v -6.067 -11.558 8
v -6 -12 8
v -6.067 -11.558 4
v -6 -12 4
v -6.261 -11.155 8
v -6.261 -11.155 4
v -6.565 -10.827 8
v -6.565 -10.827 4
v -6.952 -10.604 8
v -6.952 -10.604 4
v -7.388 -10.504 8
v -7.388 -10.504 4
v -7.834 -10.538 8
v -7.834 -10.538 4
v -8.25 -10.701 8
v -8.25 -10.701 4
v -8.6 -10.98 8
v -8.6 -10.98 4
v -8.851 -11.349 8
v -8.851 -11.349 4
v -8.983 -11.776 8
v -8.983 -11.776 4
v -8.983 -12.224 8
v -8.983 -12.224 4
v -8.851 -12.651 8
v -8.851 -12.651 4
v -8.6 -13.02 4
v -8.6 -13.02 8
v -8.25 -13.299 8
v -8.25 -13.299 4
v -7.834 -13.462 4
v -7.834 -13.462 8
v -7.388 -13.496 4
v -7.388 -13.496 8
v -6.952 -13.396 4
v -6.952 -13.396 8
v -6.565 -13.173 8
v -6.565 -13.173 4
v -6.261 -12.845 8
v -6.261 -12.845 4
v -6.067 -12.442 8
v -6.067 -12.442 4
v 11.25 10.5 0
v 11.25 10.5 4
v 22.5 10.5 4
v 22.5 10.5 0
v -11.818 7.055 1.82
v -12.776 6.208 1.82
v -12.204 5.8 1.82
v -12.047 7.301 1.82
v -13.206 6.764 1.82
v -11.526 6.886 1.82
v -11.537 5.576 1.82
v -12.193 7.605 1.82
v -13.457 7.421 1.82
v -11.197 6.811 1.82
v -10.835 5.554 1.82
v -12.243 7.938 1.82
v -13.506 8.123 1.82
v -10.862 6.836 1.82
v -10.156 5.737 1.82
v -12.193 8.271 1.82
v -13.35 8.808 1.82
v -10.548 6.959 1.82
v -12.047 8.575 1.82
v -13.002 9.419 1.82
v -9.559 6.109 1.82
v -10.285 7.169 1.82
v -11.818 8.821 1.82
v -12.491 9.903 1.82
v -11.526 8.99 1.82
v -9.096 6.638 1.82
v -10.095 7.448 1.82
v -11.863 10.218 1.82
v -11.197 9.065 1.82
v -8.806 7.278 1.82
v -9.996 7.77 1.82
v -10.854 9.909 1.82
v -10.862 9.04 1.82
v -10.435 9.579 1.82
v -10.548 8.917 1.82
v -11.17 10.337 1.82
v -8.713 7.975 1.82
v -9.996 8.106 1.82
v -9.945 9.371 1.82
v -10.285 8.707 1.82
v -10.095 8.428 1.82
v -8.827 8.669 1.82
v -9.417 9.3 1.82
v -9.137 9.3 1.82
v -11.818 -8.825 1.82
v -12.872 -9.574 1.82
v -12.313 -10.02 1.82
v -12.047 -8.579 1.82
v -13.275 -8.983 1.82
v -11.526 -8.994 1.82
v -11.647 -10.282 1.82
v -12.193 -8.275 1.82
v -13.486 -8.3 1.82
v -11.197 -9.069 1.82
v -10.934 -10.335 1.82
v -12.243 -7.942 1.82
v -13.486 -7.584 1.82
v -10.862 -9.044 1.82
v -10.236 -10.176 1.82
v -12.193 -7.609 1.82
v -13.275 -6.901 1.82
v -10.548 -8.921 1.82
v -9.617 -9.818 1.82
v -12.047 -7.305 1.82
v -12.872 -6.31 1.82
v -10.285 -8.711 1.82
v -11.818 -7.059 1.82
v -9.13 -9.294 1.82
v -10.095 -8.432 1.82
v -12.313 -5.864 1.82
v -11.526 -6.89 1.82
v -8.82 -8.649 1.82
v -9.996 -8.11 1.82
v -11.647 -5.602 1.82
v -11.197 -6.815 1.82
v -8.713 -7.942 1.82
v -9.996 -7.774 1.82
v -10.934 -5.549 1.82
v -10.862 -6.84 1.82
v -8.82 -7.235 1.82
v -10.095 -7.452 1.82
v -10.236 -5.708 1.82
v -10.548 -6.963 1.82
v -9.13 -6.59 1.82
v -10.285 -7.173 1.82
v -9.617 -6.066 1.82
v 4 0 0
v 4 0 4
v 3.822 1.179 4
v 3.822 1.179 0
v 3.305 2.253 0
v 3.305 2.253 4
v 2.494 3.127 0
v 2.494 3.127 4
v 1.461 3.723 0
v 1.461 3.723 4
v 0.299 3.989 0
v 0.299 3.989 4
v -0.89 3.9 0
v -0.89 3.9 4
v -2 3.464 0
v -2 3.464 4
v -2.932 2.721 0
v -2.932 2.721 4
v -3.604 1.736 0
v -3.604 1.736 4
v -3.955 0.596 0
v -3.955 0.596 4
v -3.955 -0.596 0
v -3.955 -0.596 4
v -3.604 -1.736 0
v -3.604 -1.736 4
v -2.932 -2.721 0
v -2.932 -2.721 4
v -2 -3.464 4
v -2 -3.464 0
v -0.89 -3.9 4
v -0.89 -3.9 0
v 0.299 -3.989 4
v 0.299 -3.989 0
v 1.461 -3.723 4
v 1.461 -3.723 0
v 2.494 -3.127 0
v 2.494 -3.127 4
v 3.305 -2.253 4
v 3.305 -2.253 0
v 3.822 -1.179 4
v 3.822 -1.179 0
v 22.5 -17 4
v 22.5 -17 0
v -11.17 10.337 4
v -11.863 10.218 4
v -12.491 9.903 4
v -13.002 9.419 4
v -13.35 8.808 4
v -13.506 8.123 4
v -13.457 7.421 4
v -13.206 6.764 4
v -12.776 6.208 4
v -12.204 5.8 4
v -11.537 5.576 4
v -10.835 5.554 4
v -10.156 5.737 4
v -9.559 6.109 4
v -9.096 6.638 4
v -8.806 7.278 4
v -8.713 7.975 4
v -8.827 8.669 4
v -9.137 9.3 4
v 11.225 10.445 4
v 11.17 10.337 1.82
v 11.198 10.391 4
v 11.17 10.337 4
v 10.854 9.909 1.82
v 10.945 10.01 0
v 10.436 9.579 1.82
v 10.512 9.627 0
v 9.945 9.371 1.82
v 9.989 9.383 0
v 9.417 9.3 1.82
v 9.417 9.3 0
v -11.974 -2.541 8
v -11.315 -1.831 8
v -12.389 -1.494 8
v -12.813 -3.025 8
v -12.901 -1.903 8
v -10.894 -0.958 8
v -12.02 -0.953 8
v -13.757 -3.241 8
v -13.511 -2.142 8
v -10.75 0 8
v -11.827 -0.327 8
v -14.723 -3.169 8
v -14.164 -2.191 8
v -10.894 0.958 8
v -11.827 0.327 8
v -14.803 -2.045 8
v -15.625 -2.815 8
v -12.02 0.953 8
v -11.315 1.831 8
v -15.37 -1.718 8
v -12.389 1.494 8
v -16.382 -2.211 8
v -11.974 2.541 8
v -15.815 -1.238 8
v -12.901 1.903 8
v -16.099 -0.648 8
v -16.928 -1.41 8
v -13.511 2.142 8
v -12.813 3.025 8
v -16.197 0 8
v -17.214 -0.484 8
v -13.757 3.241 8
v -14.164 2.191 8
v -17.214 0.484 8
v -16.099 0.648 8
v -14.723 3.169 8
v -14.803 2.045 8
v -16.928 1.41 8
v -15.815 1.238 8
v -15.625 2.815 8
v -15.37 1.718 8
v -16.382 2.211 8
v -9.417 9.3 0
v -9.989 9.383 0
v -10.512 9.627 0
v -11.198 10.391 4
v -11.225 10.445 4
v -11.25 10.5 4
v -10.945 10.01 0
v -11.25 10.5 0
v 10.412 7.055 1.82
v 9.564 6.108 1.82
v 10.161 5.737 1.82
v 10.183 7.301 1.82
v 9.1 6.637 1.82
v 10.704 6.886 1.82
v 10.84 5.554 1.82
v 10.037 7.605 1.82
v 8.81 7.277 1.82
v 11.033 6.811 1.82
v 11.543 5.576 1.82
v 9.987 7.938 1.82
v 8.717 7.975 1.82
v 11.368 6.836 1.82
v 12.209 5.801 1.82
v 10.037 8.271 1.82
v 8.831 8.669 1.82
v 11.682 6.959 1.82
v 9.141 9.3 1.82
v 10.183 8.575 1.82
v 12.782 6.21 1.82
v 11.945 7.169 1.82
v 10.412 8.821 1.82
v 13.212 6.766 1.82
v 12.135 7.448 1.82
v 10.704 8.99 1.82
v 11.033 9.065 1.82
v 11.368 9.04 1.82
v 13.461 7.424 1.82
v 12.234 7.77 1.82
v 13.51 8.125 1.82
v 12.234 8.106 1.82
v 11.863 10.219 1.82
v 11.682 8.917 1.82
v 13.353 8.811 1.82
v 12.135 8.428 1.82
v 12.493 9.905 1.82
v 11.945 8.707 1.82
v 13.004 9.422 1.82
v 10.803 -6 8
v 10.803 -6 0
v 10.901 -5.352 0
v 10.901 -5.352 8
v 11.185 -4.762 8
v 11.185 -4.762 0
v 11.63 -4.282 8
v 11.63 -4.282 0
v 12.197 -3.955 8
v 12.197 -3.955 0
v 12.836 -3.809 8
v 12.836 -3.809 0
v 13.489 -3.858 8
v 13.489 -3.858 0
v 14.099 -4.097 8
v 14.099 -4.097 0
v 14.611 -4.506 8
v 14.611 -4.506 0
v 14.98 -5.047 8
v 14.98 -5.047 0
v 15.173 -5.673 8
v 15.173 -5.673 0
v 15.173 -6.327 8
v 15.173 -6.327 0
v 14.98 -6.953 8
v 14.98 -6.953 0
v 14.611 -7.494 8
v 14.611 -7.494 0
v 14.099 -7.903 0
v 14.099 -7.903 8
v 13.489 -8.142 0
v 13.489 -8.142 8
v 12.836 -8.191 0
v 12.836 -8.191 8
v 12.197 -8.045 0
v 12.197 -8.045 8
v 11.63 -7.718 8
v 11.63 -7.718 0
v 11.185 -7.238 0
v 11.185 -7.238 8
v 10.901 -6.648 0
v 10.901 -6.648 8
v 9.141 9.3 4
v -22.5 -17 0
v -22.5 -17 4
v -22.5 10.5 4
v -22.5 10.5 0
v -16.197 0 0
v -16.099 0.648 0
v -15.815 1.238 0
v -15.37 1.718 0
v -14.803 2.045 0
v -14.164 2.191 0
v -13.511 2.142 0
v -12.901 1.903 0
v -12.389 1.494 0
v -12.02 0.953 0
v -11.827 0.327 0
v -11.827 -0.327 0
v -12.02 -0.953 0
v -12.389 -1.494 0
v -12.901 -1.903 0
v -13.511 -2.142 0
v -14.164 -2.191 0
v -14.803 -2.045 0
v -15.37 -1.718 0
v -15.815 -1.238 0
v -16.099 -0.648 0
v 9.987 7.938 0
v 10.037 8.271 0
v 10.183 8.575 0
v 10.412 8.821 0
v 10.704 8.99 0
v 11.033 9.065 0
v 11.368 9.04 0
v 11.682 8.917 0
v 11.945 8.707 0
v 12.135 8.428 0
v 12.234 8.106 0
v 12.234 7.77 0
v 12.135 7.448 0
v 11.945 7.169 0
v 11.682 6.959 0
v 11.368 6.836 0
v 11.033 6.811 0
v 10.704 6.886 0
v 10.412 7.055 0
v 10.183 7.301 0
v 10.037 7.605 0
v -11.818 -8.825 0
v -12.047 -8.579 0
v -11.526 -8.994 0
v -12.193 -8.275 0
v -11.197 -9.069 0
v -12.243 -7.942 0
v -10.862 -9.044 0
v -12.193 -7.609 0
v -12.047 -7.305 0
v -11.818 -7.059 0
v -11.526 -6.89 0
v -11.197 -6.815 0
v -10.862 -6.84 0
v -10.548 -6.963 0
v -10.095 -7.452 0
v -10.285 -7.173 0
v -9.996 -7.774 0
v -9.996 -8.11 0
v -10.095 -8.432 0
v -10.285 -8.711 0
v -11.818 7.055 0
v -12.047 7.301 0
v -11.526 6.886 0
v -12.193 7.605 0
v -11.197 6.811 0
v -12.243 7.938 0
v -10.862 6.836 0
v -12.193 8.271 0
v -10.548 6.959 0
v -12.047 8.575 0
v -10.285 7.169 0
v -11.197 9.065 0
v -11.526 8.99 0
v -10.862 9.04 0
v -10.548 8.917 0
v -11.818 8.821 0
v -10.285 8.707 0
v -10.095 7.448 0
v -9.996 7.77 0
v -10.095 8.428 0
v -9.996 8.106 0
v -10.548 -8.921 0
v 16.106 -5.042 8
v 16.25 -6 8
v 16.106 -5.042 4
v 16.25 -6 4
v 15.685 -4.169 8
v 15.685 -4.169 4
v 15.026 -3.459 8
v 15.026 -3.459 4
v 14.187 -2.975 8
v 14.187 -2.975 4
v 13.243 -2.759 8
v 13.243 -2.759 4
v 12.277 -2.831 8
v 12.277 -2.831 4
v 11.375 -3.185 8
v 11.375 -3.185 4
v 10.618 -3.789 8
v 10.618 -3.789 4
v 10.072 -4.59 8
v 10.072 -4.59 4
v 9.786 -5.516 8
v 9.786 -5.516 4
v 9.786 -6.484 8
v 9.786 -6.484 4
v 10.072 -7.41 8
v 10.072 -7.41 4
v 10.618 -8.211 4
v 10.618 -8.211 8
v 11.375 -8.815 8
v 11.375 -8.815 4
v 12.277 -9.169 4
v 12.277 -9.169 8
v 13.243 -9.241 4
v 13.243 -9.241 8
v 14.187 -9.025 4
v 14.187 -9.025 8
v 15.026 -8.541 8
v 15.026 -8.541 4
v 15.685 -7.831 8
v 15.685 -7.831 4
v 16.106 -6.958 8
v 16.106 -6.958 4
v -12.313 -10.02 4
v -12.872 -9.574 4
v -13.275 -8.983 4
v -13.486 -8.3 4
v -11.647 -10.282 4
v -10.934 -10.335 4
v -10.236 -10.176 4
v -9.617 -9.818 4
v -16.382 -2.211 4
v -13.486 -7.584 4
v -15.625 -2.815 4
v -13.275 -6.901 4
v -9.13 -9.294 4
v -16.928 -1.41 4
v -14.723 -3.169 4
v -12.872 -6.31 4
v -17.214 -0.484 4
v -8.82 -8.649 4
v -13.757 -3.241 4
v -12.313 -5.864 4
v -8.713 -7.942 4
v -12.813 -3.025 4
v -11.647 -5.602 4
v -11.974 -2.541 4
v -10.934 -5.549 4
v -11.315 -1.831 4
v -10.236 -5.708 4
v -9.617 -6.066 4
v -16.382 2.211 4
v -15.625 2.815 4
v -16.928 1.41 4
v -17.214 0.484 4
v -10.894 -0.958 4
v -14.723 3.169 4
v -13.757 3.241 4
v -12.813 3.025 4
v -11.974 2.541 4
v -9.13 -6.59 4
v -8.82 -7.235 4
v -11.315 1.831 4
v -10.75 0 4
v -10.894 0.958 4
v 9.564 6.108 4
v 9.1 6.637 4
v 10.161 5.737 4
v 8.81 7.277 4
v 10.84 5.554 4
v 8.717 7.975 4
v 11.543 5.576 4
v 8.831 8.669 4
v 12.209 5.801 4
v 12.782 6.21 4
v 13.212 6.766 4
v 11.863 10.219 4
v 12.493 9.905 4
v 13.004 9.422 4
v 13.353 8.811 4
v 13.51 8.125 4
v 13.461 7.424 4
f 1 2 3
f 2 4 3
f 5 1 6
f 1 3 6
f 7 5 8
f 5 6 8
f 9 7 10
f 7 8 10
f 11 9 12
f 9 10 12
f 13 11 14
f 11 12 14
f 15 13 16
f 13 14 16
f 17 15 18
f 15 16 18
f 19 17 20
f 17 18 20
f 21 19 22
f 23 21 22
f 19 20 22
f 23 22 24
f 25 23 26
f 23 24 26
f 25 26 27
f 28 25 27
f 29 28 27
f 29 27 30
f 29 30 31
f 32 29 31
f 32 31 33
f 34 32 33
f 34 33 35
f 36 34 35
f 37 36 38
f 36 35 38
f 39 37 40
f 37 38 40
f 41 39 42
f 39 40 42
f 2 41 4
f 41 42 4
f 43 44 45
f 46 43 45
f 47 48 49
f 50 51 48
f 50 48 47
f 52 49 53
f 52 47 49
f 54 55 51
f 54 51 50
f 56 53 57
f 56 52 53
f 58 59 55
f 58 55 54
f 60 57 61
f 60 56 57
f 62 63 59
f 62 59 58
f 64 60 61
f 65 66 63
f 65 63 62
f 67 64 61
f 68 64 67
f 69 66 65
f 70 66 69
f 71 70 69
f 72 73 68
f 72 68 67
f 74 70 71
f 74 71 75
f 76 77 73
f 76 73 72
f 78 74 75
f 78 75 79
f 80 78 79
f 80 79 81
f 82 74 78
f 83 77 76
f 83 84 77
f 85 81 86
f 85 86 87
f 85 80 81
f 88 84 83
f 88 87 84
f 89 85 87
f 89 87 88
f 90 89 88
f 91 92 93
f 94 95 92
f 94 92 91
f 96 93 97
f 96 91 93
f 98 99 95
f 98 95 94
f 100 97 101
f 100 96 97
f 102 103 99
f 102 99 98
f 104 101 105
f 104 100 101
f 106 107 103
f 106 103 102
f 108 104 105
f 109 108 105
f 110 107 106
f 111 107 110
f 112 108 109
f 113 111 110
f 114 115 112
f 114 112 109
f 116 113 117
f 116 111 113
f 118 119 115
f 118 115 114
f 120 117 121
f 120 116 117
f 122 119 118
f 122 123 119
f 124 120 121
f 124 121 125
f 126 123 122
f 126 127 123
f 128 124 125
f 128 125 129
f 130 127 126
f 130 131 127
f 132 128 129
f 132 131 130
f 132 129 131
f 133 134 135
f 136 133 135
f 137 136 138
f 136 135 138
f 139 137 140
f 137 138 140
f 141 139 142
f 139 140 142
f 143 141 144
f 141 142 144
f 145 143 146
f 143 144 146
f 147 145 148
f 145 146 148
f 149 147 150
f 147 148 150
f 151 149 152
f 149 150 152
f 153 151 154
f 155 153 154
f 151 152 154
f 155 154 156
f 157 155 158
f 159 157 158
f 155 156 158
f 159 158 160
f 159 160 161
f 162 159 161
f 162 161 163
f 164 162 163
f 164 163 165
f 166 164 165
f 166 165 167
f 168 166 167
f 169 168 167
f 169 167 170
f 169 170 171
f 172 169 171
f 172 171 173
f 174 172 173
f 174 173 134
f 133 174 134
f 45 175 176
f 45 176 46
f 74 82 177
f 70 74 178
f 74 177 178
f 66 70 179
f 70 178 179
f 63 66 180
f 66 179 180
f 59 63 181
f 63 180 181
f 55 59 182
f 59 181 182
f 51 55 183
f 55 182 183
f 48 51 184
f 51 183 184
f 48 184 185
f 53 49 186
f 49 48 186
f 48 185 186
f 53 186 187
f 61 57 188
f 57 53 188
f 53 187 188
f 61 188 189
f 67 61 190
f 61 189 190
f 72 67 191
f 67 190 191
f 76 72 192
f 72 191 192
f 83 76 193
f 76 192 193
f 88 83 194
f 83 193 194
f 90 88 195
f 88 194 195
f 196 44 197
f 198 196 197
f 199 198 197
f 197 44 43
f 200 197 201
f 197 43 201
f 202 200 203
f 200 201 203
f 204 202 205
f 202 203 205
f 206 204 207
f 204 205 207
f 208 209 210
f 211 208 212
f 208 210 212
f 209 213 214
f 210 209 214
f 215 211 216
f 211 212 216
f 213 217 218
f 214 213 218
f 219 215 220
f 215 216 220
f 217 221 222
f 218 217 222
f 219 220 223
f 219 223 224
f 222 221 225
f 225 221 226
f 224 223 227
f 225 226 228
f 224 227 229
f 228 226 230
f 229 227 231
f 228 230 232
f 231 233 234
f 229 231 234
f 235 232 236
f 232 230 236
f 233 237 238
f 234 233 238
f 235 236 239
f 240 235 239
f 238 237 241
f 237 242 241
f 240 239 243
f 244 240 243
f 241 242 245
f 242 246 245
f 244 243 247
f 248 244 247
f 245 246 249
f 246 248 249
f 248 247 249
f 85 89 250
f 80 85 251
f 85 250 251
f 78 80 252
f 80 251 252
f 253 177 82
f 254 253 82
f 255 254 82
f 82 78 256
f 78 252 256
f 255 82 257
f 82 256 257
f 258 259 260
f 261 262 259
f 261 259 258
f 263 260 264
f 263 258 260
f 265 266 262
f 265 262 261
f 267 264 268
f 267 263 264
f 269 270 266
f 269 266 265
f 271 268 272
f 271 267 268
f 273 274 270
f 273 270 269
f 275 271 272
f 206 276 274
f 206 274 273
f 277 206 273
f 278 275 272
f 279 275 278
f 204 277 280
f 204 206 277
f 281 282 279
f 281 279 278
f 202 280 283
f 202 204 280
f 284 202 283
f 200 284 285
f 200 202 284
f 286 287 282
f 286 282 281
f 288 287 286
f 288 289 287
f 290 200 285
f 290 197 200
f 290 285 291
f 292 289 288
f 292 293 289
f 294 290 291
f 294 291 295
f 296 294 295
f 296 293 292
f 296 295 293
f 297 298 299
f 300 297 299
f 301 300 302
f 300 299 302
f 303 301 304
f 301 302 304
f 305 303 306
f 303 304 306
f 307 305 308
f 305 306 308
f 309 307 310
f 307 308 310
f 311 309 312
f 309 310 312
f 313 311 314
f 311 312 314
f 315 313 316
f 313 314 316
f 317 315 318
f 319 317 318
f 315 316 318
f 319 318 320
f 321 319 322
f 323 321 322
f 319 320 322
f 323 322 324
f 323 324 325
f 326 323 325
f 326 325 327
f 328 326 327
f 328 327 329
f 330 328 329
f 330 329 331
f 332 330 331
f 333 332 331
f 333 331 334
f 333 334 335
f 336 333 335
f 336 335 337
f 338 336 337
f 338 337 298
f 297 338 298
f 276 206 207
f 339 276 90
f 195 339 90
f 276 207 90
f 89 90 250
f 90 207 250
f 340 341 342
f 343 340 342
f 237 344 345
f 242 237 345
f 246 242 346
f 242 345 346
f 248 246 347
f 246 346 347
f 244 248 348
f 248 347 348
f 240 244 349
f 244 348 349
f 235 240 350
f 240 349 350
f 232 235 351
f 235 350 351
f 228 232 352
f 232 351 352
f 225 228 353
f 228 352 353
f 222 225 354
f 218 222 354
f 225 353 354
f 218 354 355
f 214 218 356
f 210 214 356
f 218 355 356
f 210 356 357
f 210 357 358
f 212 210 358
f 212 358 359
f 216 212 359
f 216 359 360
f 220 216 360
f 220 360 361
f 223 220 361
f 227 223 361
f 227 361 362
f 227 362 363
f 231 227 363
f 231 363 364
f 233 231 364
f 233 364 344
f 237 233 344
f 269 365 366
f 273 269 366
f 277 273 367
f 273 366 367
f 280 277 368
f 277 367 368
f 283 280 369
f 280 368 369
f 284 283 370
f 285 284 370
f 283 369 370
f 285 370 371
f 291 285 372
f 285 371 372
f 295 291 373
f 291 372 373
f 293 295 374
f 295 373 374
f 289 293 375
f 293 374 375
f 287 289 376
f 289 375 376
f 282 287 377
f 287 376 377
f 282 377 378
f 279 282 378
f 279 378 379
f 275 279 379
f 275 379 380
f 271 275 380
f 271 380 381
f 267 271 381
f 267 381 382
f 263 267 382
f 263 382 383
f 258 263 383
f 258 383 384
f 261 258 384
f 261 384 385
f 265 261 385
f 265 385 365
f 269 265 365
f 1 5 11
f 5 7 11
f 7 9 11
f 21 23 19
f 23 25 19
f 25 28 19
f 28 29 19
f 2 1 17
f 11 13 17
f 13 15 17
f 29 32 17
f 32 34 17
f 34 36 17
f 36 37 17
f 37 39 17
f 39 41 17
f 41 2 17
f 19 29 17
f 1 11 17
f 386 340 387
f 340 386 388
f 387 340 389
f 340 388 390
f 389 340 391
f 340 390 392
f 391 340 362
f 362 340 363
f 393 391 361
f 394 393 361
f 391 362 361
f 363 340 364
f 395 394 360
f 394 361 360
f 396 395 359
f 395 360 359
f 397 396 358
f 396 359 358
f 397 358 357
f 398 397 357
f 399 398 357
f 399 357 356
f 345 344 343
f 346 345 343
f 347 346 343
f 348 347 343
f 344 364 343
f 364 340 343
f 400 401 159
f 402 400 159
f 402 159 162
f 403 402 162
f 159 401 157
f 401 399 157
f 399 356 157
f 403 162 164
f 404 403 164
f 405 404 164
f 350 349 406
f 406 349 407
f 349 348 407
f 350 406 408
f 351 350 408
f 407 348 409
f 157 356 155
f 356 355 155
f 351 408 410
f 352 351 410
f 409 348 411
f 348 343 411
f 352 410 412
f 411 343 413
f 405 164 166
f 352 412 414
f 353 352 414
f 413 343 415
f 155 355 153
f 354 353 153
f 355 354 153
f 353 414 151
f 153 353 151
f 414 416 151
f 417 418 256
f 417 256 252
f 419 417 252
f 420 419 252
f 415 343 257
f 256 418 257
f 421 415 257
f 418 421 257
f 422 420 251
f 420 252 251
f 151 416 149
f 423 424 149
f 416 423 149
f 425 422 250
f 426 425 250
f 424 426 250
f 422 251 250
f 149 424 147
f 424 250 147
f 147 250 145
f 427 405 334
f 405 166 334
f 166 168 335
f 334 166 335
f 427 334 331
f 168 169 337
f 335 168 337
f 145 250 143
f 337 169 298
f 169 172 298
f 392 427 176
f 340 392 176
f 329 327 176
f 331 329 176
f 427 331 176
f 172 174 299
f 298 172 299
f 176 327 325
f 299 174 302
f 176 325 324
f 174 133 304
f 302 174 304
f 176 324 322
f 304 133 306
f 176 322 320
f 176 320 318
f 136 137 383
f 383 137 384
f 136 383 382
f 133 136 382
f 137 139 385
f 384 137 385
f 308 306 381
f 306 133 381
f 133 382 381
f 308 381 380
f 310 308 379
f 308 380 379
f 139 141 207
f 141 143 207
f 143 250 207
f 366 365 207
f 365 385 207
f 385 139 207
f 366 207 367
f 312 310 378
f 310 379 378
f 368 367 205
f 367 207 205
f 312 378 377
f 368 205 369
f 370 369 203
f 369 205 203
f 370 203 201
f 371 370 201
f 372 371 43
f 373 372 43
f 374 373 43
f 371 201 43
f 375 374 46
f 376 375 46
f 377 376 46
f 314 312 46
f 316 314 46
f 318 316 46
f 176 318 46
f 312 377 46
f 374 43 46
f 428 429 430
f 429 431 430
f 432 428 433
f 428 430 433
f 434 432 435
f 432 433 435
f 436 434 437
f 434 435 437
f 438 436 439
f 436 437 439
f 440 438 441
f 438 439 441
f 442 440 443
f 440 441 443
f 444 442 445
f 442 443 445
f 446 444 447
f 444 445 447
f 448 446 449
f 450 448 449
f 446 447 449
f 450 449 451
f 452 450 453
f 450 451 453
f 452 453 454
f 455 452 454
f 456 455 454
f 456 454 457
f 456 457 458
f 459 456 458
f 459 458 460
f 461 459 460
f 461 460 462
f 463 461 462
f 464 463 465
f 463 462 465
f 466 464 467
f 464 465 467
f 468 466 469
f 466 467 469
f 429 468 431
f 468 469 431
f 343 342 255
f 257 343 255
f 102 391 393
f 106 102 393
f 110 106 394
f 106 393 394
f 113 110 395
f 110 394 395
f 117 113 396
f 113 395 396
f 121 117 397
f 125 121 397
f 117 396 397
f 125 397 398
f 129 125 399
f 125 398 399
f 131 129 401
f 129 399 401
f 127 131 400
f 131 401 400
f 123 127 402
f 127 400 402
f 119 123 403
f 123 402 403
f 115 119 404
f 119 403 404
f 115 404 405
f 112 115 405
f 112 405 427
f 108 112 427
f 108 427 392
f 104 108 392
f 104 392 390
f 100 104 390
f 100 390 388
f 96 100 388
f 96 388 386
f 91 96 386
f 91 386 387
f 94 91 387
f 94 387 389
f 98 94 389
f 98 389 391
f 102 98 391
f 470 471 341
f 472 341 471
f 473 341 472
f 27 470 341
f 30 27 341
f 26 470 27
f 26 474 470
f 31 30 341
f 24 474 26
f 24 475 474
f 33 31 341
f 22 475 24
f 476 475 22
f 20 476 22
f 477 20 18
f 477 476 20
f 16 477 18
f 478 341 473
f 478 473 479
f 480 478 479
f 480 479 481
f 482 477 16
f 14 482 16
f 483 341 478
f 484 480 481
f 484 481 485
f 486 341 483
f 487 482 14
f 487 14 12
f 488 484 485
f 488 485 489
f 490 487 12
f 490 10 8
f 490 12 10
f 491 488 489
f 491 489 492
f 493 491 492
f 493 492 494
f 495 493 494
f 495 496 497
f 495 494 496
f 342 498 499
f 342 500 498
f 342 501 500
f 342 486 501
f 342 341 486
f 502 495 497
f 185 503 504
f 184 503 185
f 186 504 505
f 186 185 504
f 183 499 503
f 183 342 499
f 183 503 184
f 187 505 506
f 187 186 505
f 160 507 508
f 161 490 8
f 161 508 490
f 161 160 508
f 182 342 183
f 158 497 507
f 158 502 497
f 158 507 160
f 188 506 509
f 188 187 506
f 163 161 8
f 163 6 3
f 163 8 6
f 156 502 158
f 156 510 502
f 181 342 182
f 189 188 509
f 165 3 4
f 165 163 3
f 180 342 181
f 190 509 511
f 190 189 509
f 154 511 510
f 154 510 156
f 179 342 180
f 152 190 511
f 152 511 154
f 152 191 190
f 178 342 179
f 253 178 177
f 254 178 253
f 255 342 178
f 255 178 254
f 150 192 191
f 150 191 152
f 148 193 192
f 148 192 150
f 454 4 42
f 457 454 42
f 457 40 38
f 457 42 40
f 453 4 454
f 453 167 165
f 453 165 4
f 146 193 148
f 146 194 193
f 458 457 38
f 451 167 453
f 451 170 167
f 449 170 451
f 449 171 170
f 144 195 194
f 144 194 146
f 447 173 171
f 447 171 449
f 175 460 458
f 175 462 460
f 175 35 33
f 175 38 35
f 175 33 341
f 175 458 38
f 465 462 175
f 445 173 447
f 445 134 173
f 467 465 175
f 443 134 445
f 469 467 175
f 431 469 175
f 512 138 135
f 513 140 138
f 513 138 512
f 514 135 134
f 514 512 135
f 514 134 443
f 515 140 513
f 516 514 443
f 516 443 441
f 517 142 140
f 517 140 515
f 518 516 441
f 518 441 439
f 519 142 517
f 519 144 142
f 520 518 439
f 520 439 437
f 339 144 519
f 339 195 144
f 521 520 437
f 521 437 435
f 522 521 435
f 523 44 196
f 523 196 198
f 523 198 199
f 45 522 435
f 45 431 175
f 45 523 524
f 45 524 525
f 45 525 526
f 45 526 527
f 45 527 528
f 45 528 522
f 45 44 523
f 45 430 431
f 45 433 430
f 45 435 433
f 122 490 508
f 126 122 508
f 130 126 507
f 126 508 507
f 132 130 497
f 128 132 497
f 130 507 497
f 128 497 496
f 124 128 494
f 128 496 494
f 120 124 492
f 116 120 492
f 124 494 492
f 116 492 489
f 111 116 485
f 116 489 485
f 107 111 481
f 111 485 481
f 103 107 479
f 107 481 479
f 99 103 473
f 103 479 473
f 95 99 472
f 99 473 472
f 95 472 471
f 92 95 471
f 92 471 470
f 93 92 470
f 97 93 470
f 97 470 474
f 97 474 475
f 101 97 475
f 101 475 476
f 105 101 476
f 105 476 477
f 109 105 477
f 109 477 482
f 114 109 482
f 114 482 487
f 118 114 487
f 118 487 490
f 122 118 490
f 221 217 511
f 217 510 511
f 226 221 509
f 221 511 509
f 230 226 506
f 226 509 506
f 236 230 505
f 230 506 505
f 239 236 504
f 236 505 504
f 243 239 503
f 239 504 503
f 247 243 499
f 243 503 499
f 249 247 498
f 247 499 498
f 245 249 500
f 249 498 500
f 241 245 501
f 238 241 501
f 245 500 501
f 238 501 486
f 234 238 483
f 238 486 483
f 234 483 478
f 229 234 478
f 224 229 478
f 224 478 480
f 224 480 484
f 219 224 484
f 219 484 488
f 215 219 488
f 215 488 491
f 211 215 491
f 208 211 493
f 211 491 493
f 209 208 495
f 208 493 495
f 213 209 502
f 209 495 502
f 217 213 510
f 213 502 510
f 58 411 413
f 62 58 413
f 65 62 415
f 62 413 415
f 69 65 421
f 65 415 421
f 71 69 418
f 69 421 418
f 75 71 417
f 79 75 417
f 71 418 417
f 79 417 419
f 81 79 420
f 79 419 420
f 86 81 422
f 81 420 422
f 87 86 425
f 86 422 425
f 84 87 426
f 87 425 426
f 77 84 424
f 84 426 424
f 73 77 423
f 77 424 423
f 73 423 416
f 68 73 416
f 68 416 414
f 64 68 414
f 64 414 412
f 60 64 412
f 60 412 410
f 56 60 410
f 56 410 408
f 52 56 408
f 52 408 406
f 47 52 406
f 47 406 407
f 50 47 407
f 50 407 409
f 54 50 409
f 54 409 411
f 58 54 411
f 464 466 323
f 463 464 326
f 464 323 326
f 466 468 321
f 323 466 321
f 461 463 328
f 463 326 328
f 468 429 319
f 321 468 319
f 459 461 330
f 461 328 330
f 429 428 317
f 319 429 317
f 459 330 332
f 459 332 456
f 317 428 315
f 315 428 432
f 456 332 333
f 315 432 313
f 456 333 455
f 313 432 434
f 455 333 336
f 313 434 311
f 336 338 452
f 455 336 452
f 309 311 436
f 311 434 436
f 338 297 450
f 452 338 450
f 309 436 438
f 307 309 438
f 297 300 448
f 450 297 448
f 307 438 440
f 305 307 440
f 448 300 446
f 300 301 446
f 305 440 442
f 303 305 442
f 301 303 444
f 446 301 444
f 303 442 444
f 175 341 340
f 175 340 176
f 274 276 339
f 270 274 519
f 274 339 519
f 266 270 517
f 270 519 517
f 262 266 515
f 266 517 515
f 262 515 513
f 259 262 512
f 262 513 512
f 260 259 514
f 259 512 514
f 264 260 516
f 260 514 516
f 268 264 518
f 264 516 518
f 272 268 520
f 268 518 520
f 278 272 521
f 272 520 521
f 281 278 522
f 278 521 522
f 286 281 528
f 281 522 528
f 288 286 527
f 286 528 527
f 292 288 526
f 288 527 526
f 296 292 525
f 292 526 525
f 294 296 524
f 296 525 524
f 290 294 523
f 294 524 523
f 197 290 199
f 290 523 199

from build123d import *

# Parameters (mm, degrees)
SKETCH1_W                                        = 45
SKETCH1_H                                        = 27.5
BOSS_EXTRUDE1_DEPTH                              = 4
CUT_EXTRUDE1_DEPTH                               = 5
SKETCH3_W                                        = 3.25
SKETCH3_H                                        = 4
SKETCH4_W                                        = 1.5
SKETCH4_H                                        = 4
SKETCH5_W                                        = 3.25
SKETCH5_H                                        = 4
F_8_0_8_DIAMETER_HOLE1_D                         = 8
F_8_0_8_DIAMETER_HOLE1_DEPTH                     = 8
CBORE_FOR_M2_HEX_HEAD_MACHINE_SCREW1_D           = 2.26
CBORE_FOR_M2_HEX_HEAD_MACHINE_SCREW1_DEPTH       = 4
CBORE_FOR_M2_HEX_HEAD_MACHINE_SCREW1_CBORE_D     = 4.8
CBORE_FOR_M2_HEX_HEAD_MACHINE_SCREW1_CBORE_DEPTH = 2.18
TAPPED_HOLE_FOR_8_32_HELICOIL1_D                 = 4.3942
TAPPED_HOLE_FOR_8_32_HELICOIL1_DEPTH             = 13.335
TAPPED_HOLE_FOR_8_32_HELICOIL1_TIP               = 1.320150866


with BuildPart() as part:
    # Sketch1 → Boss-Extrude1 (new body)
    with BuildSketch(Plane.XY.offset(4)):
        with Locations((0, -3.25)):
            Rectangle(SKETCH1_W, SKETCH1_H)
    extrude(amount=-BOSS_EXTRUDE1_DEPTH)

    # Sketch2 → Cut-Extrude1 (cut, through all)
    with BuildSketch(Plane(origin=(0, 0, 0), x_dir=(-1, 0, 0), z_dir=(0, 0, -1))):
        with BuildLine():
            Line((-9.416969722, 9.3), (9.416969722, 9.3))
            ThreePointArc((9.416969722, 9.3), (10.512414837, 9.626679947), (11.25, 10.5))
            Line((11.25, 10.5), (-11.25, 10.5))
            ThreePointArc((-11.25, 10.5), (-10.512414837, 9.626679947), (-9.416969722, 9.3))
        make_face()
    extrude(amount=-CUT_EXTRUDE1_DEPTH, mode=Mode.SUBTRACT)

    # Sketch3 → Revolve1 (revolve)
    with BuildSketch(Plane(origin=(0, -6, 0), x_dir=(1, 0, 0), z_dir=(0, 1, 0))):
        with Locations((14.625, -6)):
            Rectangle(SKETCH3_W, SKETCH3_H)
    revolve(axis=Axis((13, -6, 4), (0, 0, 1)))

    # Sketch4 → Revolve2 (revolve)
    with BuildSketch(Plane(origin=(0, -12, 0), x_dir=(1, 0, 0), z_dir=(0, 1, 0))):
        with Locations((-6.75, -6)):
            Rectangle(SKETCH4_W, SKETCH4_H)
    revolve(axis=Axis((-7.5, -12, 4), (0, 0, 1)))

    # Sketch5 → Revolve3 (revolve)
    with BuildSketch(Plane(origin=(0, 0, 0), x_dir=(1, 0, 0), z_dir=(0, 1, 0))):
        with Locations((-12.375, -6)):
            Rectangle(SKETCH5_W, SKETCH5_H)
    revolve(axis=Axis((-14, 0, 4), (0, 0, 1)))

    # Ø8.0 (8) Diameter Hole1
    with Locations(Plane(origin=(0, 0, 0), x_dir=(-1, 0, 0), z_dir=(0, 0, -1))):
        with Locations((0, 0)):
            Hole(F_8_0_8_DIAMETER_HOLE1_D / 2, depth=F_8_0_8_DIAMETER_HOLE1_DEPTH)

    # CBORE for M2 Hex Head Machine Screw1
    with Locations(Plane.XY.offset(4)):
        with Locations((-11.113, -7.942), (-11.113, 7.938), (11.117, 7.938)):
            CounterBoreHole(CBORE_FOR_M2_HEX_HEAD_MACHINE_SCREW1_D / 2, CBORE_FOR_M2_HEX_HEAD_MACHINE_SCREW1_CBORE_D / 2, CBORE_FOR_M2_HEX_HEAD_MACHINE_SCREW1_CBORE_DEPTH, depth=CBORE_FOR_M2_HEX_HEAD_MACHINE_SCREW1_DEPTH)

    # Tapped Hole for #8-32 Helicoil1
    with Locations(Plane.XY.offset(8)):
        with Locations((-14, 0), (13, -6)):
            Hole(TAPPED_HOLE_FOR_8_32_HELICOIL1_D / 2, depth=TAPPED_HOLE_FOR_8_32_HELICOIL1_DEPTH)
            with Locations((0, 0, -(TAPPED_HOLE_FOR_8_32_HELICOIL1_DEPTH + TAPPED_HOLE_FOR_8_32_HELICOIL1_TIP / 2))):  # 118° drill point
                Cone(0, TAPPED_HOLE_FOR_8_32_HELICOIL1_D / 2, TAPPED_HOLE_FOR_8_32_HELICOIL1_TIP, mode=Mode.SUBTRACT)


solid = part.part
